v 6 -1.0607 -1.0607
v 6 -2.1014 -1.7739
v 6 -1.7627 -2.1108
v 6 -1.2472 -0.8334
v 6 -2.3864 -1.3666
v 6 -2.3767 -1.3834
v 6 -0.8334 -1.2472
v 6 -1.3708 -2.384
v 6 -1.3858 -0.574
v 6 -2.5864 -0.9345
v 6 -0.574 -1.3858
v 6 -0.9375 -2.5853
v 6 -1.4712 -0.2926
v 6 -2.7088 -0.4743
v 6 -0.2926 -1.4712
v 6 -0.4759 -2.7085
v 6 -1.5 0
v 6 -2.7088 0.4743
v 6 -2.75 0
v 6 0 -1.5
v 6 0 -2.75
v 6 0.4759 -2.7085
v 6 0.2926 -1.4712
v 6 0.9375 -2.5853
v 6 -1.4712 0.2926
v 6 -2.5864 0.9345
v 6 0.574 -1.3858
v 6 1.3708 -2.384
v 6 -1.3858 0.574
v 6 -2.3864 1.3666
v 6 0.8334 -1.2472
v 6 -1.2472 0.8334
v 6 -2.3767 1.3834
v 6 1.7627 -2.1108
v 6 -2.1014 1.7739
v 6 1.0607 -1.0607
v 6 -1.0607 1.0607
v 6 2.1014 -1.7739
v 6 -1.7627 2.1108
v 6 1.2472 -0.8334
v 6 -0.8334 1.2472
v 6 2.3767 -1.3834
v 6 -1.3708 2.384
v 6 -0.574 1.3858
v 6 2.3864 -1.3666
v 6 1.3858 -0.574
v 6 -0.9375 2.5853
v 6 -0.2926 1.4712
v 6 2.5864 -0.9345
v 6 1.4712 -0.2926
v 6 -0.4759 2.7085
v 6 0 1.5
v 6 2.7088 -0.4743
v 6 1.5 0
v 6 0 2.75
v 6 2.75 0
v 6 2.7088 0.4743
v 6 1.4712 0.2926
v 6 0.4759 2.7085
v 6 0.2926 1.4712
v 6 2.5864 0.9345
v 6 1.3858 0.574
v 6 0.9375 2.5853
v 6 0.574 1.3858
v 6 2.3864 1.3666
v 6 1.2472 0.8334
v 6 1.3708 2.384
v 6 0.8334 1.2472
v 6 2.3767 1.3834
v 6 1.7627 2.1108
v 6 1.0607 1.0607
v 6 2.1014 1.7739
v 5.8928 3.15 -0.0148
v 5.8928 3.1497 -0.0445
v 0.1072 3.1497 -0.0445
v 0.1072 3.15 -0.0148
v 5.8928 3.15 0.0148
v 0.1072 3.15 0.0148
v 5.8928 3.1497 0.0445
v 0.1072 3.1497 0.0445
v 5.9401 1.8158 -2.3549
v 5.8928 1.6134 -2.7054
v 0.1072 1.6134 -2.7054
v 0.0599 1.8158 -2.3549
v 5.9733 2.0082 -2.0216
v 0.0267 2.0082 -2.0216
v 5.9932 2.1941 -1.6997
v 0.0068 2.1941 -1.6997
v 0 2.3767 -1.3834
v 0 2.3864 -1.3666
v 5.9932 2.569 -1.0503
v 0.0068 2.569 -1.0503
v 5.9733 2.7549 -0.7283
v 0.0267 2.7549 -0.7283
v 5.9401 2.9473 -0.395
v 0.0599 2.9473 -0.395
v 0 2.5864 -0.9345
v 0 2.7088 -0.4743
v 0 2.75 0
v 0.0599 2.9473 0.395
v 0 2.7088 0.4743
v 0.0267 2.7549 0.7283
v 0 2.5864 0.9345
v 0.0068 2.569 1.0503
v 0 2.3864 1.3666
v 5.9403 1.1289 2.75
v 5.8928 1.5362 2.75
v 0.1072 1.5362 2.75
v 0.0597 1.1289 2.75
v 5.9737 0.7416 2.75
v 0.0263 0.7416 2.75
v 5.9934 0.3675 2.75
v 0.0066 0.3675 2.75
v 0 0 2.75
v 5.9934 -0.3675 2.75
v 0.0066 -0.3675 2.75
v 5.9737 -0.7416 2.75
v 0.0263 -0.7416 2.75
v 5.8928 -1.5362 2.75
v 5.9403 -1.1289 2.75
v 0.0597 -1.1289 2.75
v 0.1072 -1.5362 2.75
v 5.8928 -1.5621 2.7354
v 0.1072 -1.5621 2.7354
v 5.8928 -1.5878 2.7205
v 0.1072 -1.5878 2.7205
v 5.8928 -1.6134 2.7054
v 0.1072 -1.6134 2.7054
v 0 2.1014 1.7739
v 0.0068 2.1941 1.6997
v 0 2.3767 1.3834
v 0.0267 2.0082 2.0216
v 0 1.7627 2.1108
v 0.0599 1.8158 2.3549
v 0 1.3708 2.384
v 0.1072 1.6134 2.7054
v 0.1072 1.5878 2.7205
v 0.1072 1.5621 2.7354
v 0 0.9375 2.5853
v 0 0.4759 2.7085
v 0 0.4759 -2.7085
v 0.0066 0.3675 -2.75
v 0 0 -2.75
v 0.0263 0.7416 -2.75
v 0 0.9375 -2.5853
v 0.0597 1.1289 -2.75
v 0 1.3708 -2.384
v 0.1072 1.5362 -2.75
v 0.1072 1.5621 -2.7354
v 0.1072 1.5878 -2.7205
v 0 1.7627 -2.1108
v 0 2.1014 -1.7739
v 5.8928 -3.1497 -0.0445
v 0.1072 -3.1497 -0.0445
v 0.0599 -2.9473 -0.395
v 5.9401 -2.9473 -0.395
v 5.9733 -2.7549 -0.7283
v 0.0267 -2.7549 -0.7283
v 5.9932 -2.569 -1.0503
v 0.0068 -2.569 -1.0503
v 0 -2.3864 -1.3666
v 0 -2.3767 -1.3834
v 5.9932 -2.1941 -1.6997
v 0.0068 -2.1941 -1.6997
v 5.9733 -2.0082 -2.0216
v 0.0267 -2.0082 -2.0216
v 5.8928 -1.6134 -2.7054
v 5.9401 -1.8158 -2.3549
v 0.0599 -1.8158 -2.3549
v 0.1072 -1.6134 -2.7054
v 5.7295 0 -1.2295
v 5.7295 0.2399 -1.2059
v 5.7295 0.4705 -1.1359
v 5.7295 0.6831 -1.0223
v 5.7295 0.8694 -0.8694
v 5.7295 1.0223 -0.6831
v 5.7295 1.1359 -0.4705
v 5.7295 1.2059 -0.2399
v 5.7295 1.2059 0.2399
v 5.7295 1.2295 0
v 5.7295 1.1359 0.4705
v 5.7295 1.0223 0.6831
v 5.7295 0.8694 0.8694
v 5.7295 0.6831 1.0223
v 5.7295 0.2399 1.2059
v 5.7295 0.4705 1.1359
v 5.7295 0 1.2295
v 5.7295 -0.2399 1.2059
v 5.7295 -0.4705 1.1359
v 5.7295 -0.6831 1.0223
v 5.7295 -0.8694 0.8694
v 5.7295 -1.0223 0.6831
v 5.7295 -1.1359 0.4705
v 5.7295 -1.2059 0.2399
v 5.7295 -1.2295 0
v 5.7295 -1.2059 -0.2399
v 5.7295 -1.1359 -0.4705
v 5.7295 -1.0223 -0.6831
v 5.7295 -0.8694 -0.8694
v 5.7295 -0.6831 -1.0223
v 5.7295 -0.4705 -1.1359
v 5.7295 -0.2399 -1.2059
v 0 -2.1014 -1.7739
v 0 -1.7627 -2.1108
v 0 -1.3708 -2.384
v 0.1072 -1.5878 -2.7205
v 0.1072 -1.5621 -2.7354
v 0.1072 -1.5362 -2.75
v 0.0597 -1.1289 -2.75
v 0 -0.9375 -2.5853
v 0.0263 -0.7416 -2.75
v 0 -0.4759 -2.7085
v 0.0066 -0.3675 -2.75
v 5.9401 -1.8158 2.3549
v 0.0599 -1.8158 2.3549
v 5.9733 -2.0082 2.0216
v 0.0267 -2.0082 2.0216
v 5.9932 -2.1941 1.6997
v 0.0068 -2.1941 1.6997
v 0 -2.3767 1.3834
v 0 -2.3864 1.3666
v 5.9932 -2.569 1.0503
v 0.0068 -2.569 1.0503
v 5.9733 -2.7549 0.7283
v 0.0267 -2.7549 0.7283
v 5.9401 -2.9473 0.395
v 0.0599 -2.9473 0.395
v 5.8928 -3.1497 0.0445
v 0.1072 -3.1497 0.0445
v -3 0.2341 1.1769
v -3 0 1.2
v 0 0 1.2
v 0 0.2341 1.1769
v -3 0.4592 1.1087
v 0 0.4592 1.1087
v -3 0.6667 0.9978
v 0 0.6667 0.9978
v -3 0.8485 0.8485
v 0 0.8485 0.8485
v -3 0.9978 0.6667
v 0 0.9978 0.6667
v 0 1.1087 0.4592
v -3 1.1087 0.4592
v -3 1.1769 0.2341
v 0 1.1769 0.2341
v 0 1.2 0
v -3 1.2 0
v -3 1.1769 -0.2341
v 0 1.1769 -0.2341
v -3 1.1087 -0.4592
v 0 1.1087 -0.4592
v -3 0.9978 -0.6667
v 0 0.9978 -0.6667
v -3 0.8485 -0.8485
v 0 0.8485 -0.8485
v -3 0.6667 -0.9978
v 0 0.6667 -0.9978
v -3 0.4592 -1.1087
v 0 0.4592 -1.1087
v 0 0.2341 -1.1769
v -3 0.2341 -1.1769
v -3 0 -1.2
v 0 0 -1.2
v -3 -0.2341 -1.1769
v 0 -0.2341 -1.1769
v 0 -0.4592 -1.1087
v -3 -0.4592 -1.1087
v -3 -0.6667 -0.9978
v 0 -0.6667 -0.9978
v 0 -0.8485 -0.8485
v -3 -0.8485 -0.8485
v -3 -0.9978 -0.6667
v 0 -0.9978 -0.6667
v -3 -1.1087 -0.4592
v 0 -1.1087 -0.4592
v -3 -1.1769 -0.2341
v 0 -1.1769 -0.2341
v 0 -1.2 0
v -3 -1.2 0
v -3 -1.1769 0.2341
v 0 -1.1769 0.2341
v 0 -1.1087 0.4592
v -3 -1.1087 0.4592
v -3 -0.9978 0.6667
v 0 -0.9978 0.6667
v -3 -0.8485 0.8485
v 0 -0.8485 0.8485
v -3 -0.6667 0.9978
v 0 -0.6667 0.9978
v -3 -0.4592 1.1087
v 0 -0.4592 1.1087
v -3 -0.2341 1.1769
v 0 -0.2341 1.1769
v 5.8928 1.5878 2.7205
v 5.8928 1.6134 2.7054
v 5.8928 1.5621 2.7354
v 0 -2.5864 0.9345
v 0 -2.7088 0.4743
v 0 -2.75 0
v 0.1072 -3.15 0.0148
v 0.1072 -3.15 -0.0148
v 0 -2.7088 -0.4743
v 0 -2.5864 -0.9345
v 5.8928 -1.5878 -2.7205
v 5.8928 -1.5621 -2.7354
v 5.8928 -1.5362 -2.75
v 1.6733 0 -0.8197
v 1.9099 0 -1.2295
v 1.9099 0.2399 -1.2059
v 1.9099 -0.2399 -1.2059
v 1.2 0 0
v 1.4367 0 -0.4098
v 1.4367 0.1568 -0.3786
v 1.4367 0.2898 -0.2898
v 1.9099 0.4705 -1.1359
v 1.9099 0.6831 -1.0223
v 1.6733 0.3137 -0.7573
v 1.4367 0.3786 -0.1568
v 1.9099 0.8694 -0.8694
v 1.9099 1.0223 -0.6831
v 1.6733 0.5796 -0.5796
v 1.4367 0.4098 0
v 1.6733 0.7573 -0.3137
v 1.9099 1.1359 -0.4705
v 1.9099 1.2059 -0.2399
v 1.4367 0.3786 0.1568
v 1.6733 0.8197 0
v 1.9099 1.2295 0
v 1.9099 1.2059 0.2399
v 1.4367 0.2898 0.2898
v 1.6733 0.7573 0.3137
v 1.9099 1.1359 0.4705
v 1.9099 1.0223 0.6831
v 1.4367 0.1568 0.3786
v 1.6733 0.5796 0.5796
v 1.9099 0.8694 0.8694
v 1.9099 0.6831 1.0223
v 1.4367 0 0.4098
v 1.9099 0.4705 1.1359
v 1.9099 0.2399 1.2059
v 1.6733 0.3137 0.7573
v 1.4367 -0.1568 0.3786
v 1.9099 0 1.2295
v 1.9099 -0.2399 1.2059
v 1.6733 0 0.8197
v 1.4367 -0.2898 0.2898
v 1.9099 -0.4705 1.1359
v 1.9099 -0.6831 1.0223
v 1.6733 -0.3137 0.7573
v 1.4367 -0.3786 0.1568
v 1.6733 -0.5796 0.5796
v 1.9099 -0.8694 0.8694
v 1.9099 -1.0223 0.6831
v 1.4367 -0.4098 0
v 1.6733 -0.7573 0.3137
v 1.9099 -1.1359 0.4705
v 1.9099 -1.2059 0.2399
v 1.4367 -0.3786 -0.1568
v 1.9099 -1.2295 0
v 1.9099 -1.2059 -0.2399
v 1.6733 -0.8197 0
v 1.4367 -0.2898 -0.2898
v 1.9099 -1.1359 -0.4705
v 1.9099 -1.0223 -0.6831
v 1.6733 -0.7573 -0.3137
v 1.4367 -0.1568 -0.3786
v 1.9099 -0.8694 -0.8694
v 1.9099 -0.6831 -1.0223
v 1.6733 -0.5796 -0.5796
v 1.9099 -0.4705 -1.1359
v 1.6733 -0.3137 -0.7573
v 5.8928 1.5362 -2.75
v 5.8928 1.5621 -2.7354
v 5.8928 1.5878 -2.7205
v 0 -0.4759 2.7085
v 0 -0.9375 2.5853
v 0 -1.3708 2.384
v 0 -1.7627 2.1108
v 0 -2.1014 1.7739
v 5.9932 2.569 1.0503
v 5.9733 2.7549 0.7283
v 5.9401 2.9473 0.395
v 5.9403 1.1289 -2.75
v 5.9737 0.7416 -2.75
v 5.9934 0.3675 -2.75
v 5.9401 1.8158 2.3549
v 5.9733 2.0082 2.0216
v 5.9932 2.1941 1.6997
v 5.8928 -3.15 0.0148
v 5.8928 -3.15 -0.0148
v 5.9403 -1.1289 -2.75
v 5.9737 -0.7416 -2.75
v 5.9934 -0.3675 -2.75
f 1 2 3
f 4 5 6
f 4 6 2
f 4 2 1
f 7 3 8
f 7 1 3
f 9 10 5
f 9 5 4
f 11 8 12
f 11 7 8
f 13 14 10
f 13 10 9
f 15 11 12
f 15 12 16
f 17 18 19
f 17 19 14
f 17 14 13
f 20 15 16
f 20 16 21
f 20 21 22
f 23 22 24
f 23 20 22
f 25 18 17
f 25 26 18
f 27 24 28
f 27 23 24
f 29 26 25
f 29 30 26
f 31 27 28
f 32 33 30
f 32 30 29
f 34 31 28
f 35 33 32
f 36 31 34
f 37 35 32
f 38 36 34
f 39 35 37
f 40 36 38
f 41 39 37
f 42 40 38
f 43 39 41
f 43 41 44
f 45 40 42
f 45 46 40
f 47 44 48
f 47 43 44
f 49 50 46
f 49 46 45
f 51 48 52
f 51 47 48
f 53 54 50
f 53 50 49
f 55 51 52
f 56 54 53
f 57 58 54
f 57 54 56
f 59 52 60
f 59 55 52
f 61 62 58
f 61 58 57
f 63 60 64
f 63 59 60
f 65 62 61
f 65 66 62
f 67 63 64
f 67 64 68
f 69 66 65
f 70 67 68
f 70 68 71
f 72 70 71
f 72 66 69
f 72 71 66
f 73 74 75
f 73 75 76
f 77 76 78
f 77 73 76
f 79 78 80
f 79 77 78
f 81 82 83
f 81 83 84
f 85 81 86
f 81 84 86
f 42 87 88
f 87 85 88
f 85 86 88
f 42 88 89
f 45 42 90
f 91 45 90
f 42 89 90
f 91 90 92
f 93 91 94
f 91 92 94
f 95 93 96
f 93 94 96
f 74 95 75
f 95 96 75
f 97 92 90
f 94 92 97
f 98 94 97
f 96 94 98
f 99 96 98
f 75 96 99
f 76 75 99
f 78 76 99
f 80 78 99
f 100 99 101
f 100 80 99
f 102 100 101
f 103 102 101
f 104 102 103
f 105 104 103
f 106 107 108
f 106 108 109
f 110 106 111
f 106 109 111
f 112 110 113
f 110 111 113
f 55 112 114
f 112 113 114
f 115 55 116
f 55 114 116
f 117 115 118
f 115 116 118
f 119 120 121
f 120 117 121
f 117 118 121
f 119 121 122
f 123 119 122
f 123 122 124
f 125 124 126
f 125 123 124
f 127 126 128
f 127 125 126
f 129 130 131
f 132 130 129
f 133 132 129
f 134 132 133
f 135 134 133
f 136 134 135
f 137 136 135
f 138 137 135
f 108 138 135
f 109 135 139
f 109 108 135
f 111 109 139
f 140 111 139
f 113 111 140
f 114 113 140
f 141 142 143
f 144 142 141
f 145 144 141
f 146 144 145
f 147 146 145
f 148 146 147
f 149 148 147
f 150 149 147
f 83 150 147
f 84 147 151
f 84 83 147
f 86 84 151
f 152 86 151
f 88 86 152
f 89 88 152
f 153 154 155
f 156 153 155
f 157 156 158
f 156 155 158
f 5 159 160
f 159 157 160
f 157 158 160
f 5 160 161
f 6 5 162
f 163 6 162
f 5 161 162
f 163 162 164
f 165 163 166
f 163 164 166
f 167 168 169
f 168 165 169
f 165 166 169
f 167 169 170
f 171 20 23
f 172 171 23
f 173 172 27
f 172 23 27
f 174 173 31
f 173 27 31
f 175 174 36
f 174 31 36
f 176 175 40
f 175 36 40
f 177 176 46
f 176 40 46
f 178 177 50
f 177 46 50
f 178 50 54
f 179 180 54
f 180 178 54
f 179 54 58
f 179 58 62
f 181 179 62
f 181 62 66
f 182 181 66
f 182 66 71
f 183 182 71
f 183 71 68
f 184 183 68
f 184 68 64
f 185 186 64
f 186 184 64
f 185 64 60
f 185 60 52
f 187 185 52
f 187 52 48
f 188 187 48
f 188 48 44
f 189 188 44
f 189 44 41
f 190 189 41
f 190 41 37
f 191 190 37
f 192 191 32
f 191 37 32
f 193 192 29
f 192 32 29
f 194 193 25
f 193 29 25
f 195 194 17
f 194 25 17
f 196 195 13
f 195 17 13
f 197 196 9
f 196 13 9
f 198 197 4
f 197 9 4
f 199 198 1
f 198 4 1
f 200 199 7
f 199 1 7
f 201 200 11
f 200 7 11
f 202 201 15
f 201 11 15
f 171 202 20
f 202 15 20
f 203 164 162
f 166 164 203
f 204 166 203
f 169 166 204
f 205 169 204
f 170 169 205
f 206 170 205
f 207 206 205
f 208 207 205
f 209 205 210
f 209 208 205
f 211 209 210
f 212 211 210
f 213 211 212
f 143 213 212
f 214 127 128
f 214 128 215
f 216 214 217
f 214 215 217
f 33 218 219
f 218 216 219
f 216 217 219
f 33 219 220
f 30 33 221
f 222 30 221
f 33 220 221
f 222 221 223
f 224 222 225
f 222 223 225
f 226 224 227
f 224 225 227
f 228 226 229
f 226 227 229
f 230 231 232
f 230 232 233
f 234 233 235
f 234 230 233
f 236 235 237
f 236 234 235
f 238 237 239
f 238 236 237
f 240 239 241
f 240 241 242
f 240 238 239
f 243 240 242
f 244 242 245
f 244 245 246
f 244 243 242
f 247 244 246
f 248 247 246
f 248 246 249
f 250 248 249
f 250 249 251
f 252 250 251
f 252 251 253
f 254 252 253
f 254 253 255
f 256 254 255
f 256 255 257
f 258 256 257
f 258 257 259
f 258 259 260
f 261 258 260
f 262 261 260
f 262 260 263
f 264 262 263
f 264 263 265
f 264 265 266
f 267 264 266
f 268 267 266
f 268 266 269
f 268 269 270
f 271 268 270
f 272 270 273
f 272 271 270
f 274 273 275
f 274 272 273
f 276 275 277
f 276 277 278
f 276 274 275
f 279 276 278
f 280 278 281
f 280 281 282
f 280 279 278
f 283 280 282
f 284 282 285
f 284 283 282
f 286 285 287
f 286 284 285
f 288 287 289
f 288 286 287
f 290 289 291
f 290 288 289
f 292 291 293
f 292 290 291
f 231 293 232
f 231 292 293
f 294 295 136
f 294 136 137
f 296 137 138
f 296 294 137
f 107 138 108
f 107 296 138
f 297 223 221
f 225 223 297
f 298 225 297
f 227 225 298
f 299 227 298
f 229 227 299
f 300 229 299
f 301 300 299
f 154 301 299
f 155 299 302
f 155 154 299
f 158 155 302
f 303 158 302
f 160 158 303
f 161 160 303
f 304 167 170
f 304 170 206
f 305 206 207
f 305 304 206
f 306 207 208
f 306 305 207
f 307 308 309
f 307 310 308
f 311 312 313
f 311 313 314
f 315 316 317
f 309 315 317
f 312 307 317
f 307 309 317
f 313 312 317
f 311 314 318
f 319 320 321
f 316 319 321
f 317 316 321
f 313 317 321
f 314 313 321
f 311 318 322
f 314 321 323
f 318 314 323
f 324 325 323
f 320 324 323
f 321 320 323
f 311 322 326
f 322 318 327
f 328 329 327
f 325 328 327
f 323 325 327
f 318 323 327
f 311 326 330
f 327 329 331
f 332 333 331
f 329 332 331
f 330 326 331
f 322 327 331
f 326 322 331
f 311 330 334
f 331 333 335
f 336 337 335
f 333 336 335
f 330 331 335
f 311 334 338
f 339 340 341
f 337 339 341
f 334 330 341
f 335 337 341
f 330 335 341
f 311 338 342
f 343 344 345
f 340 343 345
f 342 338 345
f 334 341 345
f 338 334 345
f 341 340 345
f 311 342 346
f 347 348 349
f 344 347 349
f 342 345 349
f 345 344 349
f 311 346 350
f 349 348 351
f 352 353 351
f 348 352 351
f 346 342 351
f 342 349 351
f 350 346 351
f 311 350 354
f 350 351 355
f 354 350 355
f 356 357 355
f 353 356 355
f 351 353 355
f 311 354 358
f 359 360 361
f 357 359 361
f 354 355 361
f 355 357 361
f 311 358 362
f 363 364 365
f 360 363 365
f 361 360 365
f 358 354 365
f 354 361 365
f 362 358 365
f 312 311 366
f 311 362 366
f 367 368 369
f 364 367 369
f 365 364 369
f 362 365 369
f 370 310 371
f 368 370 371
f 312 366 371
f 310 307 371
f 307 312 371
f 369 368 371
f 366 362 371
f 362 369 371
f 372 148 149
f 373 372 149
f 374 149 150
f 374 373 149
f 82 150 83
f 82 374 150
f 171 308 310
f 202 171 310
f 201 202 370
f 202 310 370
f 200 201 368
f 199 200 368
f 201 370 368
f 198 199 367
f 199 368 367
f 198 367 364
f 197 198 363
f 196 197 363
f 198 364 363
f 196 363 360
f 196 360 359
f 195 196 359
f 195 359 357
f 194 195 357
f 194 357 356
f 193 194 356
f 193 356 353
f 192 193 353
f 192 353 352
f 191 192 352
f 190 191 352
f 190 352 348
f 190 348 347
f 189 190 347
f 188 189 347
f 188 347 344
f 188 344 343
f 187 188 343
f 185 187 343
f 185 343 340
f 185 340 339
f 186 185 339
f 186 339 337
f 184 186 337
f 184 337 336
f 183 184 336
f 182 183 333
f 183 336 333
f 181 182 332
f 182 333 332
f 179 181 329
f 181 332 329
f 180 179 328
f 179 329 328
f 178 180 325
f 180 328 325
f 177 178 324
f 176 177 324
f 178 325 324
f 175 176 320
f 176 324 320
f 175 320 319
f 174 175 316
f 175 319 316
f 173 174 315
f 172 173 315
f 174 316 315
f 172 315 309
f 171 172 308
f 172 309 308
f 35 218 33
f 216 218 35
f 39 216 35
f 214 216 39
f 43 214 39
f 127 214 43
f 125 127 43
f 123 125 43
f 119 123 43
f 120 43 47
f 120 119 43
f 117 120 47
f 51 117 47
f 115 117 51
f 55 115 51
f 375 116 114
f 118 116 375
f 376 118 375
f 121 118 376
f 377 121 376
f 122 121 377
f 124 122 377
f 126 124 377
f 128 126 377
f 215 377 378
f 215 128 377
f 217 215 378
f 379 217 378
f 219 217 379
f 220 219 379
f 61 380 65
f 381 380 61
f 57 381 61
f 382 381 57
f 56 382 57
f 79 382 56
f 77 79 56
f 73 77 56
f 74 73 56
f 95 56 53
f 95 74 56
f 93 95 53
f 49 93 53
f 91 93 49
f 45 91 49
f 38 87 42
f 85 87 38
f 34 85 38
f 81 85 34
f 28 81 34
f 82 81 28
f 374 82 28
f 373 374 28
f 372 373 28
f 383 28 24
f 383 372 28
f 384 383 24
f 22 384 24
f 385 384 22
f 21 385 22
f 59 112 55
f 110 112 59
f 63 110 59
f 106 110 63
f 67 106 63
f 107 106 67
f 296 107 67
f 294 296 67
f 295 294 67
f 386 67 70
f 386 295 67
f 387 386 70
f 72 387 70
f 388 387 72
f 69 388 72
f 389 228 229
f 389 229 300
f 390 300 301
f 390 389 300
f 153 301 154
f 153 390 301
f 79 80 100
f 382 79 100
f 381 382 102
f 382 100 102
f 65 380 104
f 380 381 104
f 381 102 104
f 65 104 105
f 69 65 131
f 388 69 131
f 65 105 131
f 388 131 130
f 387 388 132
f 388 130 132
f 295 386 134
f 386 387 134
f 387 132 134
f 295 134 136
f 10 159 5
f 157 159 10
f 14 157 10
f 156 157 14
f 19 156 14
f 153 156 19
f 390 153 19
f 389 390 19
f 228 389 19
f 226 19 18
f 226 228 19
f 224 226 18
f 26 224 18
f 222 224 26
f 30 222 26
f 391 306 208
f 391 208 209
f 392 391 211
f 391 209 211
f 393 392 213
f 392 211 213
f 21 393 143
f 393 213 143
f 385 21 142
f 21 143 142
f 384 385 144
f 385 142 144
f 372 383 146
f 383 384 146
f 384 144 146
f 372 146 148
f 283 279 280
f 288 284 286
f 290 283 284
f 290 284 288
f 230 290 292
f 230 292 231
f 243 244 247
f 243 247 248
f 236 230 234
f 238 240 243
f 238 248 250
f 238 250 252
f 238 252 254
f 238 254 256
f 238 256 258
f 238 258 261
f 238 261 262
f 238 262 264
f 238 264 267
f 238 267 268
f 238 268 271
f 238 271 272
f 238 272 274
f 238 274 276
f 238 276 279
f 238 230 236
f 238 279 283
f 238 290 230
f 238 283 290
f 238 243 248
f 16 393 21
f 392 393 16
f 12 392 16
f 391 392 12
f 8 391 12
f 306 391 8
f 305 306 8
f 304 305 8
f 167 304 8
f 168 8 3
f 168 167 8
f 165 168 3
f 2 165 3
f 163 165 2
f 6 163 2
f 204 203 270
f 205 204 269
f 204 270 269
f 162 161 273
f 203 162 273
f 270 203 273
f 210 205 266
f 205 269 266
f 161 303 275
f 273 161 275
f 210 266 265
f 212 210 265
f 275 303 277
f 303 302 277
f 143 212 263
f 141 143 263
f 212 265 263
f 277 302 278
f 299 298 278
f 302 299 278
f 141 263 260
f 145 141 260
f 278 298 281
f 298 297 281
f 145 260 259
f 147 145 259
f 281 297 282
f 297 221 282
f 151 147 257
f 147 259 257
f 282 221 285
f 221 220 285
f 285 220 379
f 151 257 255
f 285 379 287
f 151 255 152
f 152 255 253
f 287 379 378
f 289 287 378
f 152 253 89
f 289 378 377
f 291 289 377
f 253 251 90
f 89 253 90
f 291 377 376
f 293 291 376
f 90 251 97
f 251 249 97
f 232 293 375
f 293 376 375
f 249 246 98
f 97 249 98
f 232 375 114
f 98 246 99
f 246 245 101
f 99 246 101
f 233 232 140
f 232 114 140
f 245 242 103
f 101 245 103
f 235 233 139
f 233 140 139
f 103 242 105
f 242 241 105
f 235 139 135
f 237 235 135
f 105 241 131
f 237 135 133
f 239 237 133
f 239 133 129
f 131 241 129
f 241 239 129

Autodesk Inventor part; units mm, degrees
ref_plane "YZ Plane" through (0, 0, 0) normal (1, 0, 0) x (0, 1, 0)
ref_plane "XZ Plane" through (0, 0, 0) normal (0, 1, 0) x (-1, 0, 0)
ref_plane "XY Plane" through (0, 0, 0) normal (0, 0, 1) x (1, 0, 0)
sketch "Sketch_1" plane through (0, 0, 0) normal (0, 0, 1) x (1, 0, 0)
  line L0 (6, 0) -> (0, 0)
  line L1 (0, 0) -> (0, 2.75)
  line L2 (0, 2.75) -> (0.1072, 3.15)
  line L3 (0.1072, 3.15) -> (5.8928, 3.15)
  line L4 (5.8928, 3.15) -> (6, 2.75)
  line L5 (6, 2.75) -> (6, 0)
  line L6 (6, 0) -> (0, 0)
revolve "Revolution1" add sketch "Sketch_1" angle 360 about axis through (6, 0, 0) along (1, 0, 0)
sketch "Sketch_5" plane through (0, 0, 0) normal (0, 0, 1) x (1, 0, 0)
  line L0 (0, 0) -> (-6, 0)
  line L1 (-6, 0) -> (-6, 1.1935)
  line L2 (-6, 1.1935) -> (-5.6935, 1.5)
  line L3 (-5.6935, 1.5) -> (-0.6, 1.5)
  line L4 (-0.6, 1.5) -> (-0.6, 1.2295)
  line L5 (-0.6, 1.2295) -> (0, 1.2295)
  line L6 (0, 1.2295) -> (0, 0)
  line L7 (0, 0) -> (-6, 0)
revolve "Revolution2" add sketch "Sketch_5" angle 360 about axis through (0, 0, 0) along (1, 0, 0)
thread "Thread1" size "M3x0.5" class "6g" standard "ISO Metric profile" full length
sketch "Sketch_6" plane through (0, 0, 0) normal (1, 0, 0) x (0, 1, 0)
  circle A0 centre (0, 0) radius 6.3
  line L0 (1.5877, 2.75) -> (-1.5877, 2.75)
  line L1 (-1.5877, 2.75) -> (-3.1754, 0)
  line L2 (-3.1754, 0) -> (-1.5877, -2.75)
  line L3 (-1.5877, -2.75) -> (1.5877, -2.75)
  line L4 (1.5877, -2.75) -> (3.1754, 0)
  line L5 (3.1754, 0) -> (1.5877, 2.75)
extrude "Extrusion1" cut sketch "Sketch_6" along normal blind 6
sketch "Sketch4" plane through (6, 0, 0) normal (1, 0, 0) x (0, 0, -1)
  point P0 (0, 0)
hole "Hole1" at (6, 0, 0) direction (-1, 0, 0) diameter 2.459 depth 4.0901 tip angle 120 countersink diameter 3 countersink angle 90 thread size "M3x0.5" class "6H" standard "ISO Metric profile"
sketch "スケッチ5" plane through (-6, 0, 0) normal (-1, 0, 0) x (0, 0, 1)
  circle A0 centre (0, 0) radius 1.1935 projected
  circle A1 centre (0, 0) radius 1.2
  circle A2 centre (0, 0) radius 2.1125
  dimension "d13" = 2.4
extrude "押し出し2" cut sketch "スケッチ5" against normal blind 6 contours A2
sketch "スケッチ6" plane through (-6, 0, 0) normal (-1, 0, 0) x (0, 0, 1)
  circle A0 centre (0, 0) radius 1.1935 projected
  circle A1 centre (0, 0) radius 4.3291
extrude "押し出し3" cut sketch "スケッチ6" against normal blind 3 contours A0 | A1
properties part number "SLCG5.5-6"
